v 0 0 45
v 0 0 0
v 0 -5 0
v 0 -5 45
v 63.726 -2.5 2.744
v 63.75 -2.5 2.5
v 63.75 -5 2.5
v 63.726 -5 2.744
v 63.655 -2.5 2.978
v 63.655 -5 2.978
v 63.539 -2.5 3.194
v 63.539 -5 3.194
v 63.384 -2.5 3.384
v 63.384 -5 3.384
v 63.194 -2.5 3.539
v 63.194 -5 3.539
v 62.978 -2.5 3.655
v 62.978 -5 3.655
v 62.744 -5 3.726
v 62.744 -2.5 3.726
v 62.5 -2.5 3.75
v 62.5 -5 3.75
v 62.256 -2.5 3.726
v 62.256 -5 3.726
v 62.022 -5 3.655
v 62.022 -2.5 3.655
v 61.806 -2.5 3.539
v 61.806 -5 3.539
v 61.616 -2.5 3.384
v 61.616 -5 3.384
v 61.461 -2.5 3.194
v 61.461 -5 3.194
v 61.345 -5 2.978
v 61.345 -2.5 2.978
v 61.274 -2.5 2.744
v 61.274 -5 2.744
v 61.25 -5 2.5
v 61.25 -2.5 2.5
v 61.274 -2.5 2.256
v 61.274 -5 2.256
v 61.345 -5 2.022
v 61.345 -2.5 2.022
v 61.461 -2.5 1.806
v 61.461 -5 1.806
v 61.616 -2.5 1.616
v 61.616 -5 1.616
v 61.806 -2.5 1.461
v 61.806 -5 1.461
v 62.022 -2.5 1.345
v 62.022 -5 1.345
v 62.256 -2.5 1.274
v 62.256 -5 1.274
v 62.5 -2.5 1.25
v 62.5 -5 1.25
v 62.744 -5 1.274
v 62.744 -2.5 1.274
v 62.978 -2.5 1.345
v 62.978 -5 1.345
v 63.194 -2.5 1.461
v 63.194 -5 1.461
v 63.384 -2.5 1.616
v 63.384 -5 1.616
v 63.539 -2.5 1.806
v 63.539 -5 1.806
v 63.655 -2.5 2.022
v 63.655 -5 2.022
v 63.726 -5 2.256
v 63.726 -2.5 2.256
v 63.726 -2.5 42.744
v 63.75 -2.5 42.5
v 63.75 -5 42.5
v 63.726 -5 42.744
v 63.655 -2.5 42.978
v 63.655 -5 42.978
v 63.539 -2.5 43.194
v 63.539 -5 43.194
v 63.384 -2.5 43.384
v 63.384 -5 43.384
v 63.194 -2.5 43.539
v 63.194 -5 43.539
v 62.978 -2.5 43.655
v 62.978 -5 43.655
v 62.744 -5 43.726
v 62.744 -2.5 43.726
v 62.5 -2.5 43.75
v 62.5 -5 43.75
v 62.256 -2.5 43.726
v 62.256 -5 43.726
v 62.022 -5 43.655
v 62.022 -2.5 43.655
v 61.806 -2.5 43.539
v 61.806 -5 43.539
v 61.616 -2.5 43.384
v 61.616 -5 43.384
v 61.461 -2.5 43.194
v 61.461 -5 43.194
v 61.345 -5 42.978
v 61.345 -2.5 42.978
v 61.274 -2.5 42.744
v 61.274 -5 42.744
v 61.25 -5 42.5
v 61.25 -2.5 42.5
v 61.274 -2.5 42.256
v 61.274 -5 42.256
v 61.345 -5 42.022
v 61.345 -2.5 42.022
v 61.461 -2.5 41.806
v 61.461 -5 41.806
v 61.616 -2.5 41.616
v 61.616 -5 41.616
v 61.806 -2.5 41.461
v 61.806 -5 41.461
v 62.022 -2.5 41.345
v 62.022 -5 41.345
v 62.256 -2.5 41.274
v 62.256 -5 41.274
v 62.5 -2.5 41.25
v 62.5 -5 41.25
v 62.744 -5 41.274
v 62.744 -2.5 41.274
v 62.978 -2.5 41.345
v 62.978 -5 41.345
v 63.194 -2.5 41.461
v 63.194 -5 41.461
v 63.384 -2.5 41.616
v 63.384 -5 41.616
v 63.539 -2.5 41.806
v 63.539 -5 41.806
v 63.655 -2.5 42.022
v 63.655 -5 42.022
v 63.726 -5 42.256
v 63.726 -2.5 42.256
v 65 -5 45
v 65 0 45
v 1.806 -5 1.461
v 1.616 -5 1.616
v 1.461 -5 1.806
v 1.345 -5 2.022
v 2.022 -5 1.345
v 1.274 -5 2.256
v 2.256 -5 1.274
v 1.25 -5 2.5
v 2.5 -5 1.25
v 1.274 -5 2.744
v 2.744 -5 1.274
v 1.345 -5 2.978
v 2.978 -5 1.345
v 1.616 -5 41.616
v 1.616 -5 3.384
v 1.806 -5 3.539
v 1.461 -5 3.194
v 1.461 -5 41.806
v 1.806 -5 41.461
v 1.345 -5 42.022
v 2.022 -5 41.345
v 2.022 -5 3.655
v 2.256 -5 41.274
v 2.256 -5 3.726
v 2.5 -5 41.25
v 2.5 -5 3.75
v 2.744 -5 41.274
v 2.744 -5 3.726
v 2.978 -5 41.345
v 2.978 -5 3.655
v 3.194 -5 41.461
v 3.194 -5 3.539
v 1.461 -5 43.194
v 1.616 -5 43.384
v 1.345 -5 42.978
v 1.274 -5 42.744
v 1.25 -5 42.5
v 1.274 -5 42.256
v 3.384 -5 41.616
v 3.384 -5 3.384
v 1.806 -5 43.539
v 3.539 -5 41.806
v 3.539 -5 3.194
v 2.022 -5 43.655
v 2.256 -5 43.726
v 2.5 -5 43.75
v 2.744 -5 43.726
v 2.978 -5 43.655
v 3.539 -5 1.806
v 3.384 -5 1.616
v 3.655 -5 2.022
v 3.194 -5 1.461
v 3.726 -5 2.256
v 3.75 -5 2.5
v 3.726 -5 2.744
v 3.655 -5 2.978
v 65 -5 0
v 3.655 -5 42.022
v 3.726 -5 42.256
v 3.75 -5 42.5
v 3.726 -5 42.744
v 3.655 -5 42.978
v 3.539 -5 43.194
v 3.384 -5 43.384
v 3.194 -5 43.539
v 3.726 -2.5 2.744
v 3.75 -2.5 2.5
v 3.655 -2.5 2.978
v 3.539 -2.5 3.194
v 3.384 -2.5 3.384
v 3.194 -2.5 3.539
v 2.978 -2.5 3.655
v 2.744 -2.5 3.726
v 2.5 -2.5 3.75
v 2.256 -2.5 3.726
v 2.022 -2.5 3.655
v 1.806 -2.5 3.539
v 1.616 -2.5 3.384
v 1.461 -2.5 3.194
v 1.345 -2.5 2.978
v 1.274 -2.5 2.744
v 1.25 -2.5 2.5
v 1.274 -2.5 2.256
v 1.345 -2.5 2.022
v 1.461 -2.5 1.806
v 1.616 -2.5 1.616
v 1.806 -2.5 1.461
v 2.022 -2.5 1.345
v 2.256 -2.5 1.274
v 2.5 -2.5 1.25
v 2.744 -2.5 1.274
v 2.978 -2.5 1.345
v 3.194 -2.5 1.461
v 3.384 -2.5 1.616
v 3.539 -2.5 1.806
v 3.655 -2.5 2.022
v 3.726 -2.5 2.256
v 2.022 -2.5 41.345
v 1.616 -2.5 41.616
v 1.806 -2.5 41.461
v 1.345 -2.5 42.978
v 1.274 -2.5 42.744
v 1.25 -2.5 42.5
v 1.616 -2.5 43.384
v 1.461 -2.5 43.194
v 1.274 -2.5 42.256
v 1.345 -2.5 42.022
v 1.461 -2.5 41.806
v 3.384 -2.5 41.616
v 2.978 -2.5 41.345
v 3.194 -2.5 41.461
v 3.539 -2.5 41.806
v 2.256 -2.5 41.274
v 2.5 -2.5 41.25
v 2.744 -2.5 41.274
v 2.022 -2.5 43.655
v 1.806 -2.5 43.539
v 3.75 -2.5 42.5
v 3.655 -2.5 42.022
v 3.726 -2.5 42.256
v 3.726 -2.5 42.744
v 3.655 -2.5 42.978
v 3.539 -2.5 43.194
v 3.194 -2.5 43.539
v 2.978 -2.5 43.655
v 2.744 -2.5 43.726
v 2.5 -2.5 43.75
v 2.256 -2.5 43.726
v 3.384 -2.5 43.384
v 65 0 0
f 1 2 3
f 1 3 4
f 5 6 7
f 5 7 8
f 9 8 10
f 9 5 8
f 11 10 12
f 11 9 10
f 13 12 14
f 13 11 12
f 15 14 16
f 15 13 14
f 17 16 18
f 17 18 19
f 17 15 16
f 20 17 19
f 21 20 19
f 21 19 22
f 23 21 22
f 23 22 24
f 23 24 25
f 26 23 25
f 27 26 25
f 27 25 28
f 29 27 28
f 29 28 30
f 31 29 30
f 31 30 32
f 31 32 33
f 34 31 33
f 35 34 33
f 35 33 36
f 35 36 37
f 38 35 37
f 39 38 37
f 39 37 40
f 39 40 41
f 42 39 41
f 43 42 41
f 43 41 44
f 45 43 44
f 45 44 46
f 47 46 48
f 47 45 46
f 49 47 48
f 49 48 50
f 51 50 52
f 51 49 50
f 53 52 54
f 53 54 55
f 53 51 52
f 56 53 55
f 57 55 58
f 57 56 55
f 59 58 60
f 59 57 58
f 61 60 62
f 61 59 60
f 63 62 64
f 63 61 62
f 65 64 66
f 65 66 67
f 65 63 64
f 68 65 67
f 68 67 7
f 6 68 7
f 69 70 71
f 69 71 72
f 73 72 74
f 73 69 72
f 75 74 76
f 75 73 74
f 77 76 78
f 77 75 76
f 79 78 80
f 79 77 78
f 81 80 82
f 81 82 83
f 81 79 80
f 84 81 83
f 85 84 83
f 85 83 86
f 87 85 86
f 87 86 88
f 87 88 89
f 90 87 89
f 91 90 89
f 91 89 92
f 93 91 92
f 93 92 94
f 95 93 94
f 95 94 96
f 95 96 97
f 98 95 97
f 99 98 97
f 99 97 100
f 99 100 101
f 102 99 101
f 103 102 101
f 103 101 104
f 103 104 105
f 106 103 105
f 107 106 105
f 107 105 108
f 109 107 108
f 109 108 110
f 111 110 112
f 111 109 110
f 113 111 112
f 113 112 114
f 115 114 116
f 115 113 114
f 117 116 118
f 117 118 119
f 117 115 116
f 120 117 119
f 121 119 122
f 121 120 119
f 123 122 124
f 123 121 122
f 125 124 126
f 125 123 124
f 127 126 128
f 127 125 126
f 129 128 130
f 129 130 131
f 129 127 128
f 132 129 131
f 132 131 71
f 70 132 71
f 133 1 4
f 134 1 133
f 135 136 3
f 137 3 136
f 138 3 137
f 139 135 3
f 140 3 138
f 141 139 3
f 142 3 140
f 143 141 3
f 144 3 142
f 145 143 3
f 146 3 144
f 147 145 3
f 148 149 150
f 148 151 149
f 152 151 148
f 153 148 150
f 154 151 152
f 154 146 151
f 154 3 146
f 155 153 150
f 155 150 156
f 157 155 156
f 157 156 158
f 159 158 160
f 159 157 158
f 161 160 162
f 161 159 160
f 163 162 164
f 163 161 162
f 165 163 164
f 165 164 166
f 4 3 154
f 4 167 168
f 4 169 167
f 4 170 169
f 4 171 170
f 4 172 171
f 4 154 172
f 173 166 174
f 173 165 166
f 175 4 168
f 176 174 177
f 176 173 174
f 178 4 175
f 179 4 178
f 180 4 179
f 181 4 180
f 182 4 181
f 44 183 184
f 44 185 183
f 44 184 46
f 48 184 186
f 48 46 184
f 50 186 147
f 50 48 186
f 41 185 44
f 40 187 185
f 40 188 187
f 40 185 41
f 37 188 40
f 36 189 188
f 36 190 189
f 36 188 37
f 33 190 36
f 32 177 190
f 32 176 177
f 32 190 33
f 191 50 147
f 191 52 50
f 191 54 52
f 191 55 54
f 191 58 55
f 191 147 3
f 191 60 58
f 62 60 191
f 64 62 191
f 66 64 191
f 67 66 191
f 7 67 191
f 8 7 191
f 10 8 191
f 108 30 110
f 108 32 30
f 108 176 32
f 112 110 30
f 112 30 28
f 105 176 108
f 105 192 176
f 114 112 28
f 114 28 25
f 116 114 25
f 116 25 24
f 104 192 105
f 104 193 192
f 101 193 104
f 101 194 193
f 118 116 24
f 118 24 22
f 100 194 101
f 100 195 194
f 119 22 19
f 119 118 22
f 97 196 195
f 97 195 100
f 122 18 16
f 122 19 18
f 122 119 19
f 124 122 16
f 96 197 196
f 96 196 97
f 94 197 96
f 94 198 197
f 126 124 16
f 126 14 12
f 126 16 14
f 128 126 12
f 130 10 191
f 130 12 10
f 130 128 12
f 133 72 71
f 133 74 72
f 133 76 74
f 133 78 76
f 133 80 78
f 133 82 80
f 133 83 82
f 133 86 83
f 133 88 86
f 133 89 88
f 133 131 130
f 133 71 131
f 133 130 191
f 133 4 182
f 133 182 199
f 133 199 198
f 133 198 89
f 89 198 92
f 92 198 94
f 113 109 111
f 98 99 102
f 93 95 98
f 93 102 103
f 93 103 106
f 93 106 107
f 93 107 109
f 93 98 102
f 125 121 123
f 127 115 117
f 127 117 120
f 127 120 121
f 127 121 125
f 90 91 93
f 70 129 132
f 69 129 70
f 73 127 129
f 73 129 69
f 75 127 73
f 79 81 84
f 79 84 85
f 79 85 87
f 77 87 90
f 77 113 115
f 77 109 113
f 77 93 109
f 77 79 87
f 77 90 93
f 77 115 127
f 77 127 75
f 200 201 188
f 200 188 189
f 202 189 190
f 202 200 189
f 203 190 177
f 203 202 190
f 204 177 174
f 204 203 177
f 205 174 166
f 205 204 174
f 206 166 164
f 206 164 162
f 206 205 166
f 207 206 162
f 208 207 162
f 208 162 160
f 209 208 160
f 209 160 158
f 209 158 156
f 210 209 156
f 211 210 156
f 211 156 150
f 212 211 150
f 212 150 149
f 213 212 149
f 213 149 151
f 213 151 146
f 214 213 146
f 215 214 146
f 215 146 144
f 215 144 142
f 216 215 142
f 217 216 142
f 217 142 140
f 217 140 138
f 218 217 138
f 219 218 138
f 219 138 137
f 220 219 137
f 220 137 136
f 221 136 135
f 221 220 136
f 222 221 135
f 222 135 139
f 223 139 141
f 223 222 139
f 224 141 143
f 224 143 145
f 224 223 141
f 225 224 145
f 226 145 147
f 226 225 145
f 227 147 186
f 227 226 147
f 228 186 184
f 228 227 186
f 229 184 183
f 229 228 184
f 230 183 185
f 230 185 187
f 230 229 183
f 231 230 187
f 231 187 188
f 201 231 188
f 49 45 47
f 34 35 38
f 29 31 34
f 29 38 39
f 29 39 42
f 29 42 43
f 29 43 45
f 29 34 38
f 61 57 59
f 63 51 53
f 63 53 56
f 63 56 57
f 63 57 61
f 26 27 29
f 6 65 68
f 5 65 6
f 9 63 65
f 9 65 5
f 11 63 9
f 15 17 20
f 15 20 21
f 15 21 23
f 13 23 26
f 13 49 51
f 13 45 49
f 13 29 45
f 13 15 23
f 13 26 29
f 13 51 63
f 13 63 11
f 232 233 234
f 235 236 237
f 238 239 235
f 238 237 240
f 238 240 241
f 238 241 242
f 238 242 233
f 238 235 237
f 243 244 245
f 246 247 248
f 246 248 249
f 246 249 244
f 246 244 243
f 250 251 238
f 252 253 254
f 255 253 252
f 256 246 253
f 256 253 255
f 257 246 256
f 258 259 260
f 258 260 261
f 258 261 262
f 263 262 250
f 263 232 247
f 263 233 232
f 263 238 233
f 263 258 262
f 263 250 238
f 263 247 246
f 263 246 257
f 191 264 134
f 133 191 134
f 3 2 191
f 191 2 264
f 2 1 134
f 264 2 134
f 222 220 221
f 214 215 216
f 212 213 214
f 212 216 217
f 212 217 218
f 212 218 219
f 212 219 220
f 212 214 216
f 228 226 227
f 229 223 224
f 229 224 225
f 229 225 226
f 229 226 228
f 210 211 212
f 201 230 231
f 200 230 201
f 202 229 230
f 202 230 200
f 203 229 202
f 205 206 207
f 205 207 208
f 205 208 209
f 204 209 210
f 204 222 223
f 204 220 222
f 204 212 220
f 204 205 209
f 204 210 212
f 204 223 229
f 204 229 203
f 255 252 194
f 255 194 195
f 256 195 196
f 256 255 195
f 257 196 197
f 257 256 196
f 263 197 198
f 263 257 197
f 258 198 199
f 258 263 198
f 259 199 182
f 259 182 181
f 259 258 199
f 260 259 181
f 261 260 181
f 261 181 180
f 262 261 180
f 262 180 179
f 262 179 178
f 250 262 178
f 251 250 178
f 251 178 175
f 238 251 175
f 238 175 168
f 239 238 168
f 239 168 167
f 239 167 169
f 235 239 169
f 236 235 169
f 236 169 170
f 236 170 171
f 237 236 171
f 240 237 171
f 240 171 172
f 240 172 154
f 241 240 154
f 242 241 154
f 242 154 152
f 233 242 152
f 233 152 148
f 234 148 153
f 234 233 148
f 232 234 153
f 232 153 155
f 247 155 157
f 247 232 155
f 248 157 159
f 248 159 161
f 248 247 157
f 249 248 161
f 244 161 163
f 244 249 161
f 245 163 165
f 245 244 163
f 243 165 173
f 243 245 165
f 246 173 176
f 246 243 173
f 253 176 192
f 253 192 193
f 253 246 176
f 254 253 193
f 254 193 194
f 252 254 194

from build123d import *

# Parameters (mm, degrees)
F0_W     = 65
F0_H     = 45
F0_R     = 1.25
F1_DEPTH = 5
F2_DEPTH = 2.5


with BuildPart() as f1:
    # F0 (on Front) → F1 (new body)
    with BuildSketch(Plane.XZ):
        with Locations((32.5, 22.5)):
            Rectangle(F0_W, F0_H)
        with Locations((2.5, 2.5)):
            Circle(F0_R, mode=Mode.SUBTRACT)
        with Locations((62.5, 2.5)):
            Circle(F0_R, mode=Mode.SUBTRACT)
        with Locations((2.5, 42.5)):
            Circle(F0_R, mode=Mode.SUBTRACT)
        with Locations((62.5, 42.5)):
            Circle(F0_R, mode=Mode.SUBTRACT)
    extrude(amount=F1_DEPTH)

    # F0 (on Front) → F2 (join)
    with BuildSketch(Plane.XZ):
        with Locations((2.5, 42.5)):
            Circle(F0_R)
        with Locations((2.5, 2.5)):
            Circle(F0_R)
        with Locations((62.5, 2.5)):
            Circle(F0_R)
        with Locations((62.5, 42.5)):
            Circle(F0_R)
    extrude(amount=F2_DEPTH)


solid = f1.part
